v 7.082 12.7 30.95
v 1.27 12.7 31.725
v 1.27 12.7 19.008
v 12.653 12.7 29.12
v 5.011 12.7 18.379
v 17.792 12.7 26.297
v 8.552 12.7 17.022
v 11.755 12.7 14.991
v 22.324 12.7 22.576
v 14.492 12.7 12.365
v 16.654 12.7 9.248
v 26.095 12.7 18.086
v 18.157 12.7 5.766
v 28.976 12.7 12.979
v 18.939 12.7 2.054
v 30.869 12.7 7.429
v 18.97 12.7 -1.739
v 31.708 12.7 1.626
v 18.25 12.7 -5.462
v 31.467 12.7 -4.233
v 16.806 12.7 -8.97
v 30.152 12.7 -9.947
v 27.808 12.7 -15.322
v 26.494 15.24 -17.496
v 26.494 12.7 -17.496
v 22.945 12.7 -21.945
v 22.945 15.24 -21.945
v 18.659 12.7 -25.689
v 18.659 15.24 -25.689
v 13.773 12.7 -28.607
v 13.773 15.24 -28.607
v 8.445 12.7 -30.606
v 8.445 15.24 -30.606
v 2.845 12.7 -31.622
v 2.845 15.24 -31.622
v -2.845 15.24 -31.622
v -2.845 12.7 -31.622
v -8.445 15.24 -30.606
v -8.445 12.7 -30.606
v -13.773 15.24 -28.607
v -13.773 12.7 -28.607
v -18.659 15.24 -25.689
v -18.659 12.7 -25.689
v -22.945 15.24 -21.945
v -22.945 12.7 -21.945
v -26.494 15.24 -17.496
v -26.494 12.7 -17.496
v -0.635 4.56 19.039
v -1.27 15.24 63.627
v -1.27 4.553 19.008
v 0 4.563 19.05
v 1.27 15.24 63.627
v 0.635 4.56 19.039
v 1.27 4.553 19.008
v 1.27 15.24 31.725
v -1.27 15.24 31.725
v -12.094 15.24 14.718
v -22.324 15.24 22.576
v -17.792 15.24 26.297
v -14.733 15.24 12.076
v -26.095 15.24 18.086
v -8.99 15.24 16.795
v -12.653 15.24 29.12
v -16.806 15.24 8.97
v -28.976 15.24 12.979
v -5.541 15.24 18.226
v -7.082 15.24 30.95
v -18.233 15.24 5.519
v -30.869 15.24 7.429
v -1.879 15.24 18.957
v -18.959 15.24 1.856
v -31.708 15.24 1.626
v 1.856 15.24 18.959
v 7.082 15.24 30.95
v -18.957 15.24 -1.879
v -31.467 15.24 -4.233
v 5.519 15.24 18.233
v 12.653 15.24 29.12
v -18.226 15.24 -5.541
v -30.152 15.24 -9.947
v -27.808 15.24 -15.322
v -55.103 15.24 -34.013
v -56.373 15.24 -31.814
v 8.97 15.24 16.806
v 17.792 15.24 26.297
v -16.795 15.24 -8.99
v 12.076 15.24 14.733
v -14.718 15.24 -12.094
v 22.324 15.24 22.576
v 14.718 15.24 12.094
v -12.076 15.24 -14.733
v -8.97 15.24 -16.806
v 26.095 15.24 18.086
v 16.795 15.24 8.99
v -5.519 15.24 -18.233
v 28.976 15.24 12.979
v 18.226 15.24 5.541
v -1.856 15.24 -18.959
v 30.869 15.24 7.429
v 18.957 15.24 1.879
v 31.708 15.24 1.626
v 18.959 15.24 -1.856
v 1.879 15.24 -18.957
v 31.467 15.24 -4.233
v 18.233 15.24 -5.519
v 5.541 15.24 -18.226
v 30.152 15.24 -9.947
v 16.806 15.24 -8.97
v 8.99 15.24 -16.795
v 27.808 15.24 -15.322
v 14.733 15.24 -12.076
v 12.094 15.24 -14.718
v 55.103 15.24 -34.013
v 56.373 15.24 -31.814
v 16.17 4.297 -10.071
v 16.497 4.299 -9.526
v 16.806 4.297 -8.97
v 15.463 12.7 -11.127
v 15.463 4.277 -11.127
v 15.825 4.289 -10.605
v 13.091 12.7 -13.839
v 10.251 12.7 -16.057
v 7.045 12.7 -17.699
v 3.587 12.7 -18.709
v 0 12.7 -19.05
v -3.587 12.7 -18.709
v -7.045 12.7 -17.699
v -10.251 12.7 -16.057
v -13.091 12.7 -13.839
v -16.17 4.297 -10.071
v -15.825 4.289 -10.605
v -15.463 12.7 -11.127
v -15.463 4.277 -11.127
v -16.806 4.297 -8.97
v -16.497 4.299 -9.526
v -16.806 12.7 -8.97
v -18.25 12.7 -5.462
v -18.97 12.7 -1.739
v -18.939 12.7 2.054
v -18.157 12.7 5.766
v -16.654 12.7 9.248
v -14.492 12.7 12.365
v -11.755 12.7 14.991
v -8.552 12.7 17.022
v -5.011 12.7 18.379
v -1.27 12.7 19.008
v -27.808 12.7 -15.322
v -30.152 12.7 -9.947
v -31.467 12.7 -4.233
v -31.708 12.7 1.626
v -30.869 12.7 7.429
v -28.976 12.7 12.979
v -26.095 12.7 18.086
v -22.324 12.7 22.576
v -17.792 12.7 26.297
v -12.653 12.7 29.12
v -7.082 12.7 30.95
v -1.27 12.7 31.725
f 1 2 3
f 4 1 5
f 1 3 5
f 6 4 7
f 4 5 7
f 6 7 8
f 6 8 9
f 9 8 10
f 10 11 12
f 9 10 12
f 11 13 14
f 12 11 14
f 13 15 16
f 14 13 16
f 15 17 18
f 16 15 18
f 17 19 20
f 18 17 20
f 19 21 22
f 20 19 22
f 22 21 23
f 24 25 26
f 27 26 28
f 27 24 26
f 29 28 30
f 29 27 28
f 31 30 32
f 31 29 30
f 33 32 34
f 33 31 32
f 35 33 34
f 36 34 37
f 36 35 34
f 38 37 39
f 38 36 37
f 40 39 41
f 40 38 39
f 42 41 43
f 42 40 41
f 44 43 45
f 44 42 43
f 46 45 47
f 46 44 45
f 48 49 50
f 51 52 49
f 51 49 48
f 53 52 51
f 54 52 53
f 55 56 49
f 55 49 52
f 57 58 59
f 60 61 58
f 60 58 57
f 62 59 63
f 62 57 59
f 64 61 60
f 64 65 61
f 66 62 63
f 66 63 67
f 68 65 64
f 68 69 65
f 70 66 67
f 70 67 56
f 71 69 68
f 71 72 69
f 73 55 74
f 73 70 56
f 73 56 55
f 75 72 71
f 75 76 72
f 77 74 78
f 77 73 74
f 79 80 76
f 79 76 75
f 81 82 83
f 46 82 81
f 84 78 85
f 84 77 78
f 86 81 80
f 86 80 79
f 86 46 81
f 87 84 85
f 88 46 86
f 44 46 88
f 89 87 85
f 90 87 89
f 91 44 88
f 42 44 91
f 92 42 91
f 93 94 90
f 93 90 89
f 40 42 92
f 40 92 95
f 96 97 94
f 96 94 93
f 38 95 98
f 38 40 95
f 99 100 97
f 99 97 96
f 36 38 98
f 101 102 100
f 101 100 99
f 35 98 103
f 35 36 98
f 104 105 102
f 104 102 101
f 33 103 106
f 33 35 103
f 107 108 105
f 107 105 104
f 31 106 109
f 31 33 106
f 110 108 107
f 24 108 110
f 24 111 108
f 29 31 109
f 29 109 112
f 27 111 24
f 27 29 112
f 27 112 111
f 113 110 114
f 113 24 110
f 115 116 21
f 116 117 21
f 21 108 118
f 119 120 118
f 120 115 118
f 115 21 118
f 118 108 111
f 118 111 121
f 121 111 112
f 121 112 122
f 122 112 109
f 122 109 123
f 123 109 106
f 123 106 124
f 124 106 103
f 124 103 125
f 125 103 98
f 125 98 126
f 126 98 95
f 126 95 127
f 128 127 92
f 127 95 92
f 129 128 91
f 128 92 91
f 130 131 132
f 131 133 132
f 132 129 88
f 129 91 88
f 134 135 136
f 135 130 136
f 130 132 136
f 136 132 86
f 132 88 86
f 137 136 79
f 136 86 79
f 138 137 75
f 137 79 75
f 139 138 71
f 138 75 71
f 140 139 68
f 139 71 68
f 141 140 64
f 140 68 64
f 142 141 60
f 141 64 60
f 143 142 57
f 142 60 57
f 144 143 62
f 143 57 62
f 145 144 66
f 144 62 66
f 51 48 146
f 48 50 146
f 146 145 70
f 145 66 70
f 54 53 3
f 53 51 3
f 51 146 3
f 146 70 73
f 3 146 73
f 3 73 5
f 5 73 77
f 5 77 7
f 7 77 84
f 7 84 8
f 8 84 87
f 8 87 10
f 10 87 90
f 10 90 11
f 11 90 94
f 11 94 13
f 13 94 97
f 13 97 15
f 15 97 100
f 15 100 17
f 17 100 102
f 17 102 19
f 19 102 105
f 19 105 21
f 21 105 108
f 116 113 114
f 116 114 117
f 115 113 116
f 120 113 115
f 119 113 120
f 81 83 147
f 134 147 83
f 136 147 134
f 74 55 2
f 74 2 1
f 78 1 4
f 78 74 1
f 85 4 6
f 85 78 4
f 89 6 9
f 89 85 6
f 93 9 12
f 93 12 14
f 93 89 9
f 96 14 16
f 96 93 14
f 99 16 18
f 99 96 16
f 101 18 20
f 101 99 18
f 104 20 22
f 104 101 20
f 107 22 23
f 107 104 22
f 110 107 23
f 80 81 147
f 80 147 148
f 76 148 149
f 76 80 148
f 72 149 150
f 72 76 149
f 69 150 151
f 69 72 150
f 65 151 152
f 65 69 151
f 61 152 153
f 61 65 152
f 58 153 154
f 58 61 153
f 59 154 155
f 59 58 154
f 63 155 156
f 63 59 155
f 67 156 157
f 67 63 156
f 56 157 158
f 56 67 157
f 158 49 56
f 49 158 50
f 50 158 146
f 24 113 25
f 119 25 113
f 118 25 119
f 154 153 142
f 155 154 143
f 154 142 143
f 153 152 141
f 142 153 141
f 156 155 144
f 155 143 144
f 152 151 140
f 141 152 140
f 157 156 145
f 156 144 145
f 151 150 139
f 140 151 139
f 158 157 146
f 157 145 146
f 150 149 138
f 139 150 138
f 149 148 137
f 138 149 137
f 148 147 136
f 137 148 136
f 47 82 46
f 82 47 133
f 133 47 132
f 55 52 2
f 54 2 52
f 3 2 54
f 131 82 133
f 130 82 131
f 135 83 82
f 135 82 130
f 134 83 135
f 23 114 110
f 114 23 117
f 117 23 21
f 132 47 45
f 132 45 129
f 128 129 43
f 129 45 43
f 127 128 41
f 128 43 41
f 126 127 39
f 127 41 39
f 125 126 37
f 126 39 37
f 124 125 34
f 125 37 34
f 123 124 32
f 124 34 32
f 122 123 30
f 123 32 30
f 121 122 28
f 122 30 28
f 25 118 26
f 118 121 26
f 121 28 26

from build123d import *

# Parameters (mm, degrees)
BOSS_EXTRUDE1_DEPTH = 15.24
BOSS_EXTRUDE2_DEPTH = 1.27
CIRPATTERN1_COUNT   = 3
SKETCH4_R           = 31.75
SKETCH4_R_2         = 19.05
BOSS_EXTRUDE3_DEPTH = 2.54
SKETCH5_R           = 19.05
CUT_EXTRUDE1_DEPTH  = 87.362738352


with BuildPart() as part:
    # Sketch2 → Boss-Extrude1 (new body)
    with BuildSketch(Plane(origin=(0, 0, 0), x_dir=(1, 0, 0), z_dir=(0, 1, 0))):
        Polygon((-1.27, 0), (0, 2.199704526), (1.27, 0), align=None)
    extrude(amount=BOSS_EXTRUDE1_DEPTH)

    # Sketch3 → Boss-Extrude2 (add, symmetric)
    with BuildSketch(Plane(origin=(0, 0, 0), x_dir=(0, 0, -1), z_dir=(1, 0, 0))):
        Polygon((0, 15.24), (-63.627, 15.24), (0, 0), align=None)
    boss_extrude2 = extrude(amount=BOSS_EXTRUDE2_DEPTH, both=True)

    # CirPattern1: Boss-Extrude2 ×3 about axis
    cirpattern1_axis = Axis((0, 0, -0.733234842), (0, -1, 0))
    for i in range(1, CIRPATTERN1_COUNT):
        add(boss_extrude2.rotate(cirpattern1_axis, i * 360 / CIRPATTERN1_COUNT))

    # Sketch4 → Boss-Extrude3 (add)
    with BuildSketch(Plane(origin=(0, 15.24, 0), x_dir=(1, 0, 0), z_dir=(0, 1, 0))):
        Circle(SKETCH4_R)
        Circle(SKETCH4_R_2, mode=Mode.SUBTRACT)
    extrude(amount=-BOSS_EXTRUDE3_DEPTH)

    # Sketch5 → Cut-Extrude1 (cut, through all)
    with BuildSketch(Plane(origin=(0, 15.24, 0), x_dir=(1, 0, 0), z_dir=(0, 1, 0))):
        Circle(SKETCH5_R)
    extrude(amount=-CUT_EXTRUDE1_DEPTH, mode=Mode.SUBTRACT)


solid = part.part
